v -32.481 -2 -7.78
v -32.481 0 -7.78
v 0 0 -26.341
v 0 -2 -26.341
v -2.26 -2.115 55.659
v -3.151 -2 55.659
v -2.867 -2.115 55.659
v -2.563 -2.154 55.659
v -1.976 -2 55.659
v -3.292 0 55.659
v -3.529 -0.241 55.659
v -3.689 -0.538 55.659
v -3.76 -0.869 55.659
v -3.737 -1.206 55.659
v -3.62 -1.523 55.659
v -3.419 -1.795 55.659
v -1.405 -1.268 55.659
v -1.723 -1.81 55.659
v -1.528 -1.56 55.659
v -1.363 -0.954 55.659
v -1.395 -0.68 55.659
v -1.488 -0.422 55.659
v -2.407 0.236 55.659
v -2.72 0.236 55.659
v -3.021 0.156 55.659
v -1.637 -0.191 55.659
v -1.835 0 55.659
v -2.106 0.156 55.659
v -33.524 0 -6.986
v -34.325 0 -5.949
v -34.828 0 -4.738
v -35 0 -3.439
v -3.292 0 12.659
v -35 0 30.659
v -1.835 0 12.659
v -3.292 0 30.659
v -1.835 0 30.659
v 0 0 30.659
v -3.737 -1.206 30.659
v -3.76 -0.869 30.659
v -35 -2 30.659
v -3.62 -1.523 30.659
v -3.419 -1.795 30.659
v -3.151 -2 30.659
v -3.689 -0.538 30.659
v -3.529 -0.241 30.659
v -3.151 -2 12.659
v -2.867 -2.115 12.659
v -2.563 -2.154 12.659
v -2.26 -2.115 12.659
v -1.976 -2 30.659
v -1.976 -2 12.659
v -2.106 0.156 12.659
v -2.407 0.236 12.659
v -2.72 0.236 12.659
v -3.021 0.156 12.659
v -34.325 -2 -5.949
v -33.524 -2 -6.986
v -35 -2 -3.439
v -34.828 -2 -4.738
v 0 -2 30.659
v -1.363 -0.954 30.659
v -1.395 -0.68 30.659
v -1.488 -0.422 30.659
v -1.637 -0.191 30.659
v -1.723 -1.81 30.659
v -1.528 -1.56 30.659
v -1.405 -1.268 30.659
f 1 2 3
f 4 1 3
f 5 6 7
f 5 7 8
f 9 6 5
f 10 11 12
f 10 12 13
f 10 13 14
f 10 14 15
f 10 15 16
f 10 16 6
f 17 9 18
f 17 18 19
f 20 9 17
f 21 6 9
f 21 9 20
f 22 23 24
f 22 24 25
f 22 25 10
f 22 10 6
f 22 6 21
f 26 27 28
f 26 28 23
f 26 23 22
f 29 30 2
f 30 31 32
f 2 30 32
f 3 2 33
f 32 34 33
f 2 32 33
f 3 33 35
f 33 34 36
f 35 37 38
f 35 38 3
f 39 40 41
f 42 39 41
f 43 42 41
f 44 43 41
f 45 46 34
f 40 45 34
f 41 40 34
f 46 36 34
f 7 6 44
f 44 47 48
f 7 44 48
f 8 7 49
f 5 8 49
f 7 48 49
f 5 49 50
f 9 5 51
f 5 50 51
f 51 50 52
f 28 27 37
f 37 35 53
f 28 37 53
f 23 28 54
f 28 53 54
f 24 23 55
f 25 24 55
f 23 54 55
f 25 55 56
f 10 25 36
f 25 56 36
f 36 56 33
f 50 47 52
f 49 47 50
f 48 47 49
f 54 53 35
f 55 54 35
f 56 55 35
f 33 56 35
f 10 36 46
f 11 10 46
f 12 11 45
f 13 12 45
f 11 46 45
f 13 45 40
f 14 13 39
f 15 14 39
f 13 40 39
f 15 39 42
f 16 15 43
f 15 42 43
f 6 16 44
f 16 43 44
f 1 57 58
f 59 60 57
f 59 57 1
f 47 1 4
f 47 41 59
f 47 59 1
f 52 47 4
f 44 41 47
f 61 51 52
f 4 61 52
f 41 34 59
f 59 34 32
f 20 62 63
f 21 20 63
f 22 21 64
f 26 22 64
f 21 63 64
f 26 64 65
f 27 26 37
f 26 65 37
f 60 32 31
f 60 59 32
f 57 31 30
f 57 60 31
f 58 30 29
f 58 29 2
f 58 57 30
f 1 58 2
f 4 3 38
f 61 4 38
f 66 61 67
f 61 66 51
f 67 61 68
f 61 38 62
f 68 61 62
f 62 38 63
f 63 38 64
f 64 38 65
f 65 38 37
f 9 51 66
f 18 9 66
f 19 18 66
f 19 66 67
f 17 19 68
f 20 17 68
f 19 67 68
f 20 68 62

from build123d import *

# Parameters (mm, degrees)
F1_DEPTH = 2
F3_DEPTH = 18
F4_DEPTH = 25
F5_DEPTH = 25
F6_R     = 5


with BuildPart() as f1:
    # F0 (on Front) → F1 (new body)
    with BuildSketch(Plane.XZ):
        Polygon((0, -26.3405761516), (0, 30.6594238484), (-35, 30.6594238484), (-35, -6.3405761516), align=None)
    extrude(amount=F1_DEPTH)

    # F2 (on face) → F3 (join)
    with BuildSketch(Plane.XY.offset(30.6594238484)):
        with BuildLine():
            Line((-3.2919103401, 0), (-1.8350348686, 0))
            ThreePointArc((-1.8350348686, 0), (-2.5634726044, 0.246386627), (-3.2919103401, 0))
        make_face()
        with BuildLine():
            ThreePointArc((-3.1509034742, -2), (-2.5634726044, -2.153613373), (-1.9760417346, -2))
            Line((-1.9760417346, -2), (-3.1509034742, -2))
        make_face()
    extrude(amount=-F3_DEPTH)

    # F2 (on face) → F4 (join)
    with BuildSketch(Plane.XY.offset(30.6594238484)):
        with BuildLine():
            ThreePointArc((-1.9760417346, -2), (-1.5278768715, -1.5598653652), (-1.3634726044, -0.953613373))
            ThreePointArc((-1.3634726044, -0.953613373), (-1.4878041418, -0.4216948092), (-1.8350348686, 0))
            Line((-1.8350348686, 0), (-3.2919103401, 0))
            ThreePointArc((-3.2919103401, 0), (-3.7605012368, -1.0380080009), (-3.1509034742, -2))
            Line((-3.1509034742, -2), (-1.9760417346, -2))
        make_face()
    extrude(amount=F4_DEPTH)

    # F2 (on face) → F5 (join)
    with BuildSketch(Plane.XY.offset(30.6594238484)):
        with BuildLine():
            ThreePointArc((-3.1509034742, -2), (-2.5634726044, -2.153613373), (-1.9760417346, -2))
            Line((-1.9760417346, -2), (-3.1509034742, -2))
        make_face()
        with BuildLine():
            Line((-3.2919103401, 0), (-1.8350348686, 0))
            ThreePointArc((-1.8350348686, 0), (-2.5634726044, 0.246386627), (-3.2919103401, 0))
        make_face()
    extrude(amount=F5_DEPTH)

    # F6
    f6_edges = [f1.edges().sort_by_distance(p)[0] for p in [
        (-35, -1, -6.340576),
    ]]
    fillet(f6_edges, radius=F6_R)


solid = f1.part
